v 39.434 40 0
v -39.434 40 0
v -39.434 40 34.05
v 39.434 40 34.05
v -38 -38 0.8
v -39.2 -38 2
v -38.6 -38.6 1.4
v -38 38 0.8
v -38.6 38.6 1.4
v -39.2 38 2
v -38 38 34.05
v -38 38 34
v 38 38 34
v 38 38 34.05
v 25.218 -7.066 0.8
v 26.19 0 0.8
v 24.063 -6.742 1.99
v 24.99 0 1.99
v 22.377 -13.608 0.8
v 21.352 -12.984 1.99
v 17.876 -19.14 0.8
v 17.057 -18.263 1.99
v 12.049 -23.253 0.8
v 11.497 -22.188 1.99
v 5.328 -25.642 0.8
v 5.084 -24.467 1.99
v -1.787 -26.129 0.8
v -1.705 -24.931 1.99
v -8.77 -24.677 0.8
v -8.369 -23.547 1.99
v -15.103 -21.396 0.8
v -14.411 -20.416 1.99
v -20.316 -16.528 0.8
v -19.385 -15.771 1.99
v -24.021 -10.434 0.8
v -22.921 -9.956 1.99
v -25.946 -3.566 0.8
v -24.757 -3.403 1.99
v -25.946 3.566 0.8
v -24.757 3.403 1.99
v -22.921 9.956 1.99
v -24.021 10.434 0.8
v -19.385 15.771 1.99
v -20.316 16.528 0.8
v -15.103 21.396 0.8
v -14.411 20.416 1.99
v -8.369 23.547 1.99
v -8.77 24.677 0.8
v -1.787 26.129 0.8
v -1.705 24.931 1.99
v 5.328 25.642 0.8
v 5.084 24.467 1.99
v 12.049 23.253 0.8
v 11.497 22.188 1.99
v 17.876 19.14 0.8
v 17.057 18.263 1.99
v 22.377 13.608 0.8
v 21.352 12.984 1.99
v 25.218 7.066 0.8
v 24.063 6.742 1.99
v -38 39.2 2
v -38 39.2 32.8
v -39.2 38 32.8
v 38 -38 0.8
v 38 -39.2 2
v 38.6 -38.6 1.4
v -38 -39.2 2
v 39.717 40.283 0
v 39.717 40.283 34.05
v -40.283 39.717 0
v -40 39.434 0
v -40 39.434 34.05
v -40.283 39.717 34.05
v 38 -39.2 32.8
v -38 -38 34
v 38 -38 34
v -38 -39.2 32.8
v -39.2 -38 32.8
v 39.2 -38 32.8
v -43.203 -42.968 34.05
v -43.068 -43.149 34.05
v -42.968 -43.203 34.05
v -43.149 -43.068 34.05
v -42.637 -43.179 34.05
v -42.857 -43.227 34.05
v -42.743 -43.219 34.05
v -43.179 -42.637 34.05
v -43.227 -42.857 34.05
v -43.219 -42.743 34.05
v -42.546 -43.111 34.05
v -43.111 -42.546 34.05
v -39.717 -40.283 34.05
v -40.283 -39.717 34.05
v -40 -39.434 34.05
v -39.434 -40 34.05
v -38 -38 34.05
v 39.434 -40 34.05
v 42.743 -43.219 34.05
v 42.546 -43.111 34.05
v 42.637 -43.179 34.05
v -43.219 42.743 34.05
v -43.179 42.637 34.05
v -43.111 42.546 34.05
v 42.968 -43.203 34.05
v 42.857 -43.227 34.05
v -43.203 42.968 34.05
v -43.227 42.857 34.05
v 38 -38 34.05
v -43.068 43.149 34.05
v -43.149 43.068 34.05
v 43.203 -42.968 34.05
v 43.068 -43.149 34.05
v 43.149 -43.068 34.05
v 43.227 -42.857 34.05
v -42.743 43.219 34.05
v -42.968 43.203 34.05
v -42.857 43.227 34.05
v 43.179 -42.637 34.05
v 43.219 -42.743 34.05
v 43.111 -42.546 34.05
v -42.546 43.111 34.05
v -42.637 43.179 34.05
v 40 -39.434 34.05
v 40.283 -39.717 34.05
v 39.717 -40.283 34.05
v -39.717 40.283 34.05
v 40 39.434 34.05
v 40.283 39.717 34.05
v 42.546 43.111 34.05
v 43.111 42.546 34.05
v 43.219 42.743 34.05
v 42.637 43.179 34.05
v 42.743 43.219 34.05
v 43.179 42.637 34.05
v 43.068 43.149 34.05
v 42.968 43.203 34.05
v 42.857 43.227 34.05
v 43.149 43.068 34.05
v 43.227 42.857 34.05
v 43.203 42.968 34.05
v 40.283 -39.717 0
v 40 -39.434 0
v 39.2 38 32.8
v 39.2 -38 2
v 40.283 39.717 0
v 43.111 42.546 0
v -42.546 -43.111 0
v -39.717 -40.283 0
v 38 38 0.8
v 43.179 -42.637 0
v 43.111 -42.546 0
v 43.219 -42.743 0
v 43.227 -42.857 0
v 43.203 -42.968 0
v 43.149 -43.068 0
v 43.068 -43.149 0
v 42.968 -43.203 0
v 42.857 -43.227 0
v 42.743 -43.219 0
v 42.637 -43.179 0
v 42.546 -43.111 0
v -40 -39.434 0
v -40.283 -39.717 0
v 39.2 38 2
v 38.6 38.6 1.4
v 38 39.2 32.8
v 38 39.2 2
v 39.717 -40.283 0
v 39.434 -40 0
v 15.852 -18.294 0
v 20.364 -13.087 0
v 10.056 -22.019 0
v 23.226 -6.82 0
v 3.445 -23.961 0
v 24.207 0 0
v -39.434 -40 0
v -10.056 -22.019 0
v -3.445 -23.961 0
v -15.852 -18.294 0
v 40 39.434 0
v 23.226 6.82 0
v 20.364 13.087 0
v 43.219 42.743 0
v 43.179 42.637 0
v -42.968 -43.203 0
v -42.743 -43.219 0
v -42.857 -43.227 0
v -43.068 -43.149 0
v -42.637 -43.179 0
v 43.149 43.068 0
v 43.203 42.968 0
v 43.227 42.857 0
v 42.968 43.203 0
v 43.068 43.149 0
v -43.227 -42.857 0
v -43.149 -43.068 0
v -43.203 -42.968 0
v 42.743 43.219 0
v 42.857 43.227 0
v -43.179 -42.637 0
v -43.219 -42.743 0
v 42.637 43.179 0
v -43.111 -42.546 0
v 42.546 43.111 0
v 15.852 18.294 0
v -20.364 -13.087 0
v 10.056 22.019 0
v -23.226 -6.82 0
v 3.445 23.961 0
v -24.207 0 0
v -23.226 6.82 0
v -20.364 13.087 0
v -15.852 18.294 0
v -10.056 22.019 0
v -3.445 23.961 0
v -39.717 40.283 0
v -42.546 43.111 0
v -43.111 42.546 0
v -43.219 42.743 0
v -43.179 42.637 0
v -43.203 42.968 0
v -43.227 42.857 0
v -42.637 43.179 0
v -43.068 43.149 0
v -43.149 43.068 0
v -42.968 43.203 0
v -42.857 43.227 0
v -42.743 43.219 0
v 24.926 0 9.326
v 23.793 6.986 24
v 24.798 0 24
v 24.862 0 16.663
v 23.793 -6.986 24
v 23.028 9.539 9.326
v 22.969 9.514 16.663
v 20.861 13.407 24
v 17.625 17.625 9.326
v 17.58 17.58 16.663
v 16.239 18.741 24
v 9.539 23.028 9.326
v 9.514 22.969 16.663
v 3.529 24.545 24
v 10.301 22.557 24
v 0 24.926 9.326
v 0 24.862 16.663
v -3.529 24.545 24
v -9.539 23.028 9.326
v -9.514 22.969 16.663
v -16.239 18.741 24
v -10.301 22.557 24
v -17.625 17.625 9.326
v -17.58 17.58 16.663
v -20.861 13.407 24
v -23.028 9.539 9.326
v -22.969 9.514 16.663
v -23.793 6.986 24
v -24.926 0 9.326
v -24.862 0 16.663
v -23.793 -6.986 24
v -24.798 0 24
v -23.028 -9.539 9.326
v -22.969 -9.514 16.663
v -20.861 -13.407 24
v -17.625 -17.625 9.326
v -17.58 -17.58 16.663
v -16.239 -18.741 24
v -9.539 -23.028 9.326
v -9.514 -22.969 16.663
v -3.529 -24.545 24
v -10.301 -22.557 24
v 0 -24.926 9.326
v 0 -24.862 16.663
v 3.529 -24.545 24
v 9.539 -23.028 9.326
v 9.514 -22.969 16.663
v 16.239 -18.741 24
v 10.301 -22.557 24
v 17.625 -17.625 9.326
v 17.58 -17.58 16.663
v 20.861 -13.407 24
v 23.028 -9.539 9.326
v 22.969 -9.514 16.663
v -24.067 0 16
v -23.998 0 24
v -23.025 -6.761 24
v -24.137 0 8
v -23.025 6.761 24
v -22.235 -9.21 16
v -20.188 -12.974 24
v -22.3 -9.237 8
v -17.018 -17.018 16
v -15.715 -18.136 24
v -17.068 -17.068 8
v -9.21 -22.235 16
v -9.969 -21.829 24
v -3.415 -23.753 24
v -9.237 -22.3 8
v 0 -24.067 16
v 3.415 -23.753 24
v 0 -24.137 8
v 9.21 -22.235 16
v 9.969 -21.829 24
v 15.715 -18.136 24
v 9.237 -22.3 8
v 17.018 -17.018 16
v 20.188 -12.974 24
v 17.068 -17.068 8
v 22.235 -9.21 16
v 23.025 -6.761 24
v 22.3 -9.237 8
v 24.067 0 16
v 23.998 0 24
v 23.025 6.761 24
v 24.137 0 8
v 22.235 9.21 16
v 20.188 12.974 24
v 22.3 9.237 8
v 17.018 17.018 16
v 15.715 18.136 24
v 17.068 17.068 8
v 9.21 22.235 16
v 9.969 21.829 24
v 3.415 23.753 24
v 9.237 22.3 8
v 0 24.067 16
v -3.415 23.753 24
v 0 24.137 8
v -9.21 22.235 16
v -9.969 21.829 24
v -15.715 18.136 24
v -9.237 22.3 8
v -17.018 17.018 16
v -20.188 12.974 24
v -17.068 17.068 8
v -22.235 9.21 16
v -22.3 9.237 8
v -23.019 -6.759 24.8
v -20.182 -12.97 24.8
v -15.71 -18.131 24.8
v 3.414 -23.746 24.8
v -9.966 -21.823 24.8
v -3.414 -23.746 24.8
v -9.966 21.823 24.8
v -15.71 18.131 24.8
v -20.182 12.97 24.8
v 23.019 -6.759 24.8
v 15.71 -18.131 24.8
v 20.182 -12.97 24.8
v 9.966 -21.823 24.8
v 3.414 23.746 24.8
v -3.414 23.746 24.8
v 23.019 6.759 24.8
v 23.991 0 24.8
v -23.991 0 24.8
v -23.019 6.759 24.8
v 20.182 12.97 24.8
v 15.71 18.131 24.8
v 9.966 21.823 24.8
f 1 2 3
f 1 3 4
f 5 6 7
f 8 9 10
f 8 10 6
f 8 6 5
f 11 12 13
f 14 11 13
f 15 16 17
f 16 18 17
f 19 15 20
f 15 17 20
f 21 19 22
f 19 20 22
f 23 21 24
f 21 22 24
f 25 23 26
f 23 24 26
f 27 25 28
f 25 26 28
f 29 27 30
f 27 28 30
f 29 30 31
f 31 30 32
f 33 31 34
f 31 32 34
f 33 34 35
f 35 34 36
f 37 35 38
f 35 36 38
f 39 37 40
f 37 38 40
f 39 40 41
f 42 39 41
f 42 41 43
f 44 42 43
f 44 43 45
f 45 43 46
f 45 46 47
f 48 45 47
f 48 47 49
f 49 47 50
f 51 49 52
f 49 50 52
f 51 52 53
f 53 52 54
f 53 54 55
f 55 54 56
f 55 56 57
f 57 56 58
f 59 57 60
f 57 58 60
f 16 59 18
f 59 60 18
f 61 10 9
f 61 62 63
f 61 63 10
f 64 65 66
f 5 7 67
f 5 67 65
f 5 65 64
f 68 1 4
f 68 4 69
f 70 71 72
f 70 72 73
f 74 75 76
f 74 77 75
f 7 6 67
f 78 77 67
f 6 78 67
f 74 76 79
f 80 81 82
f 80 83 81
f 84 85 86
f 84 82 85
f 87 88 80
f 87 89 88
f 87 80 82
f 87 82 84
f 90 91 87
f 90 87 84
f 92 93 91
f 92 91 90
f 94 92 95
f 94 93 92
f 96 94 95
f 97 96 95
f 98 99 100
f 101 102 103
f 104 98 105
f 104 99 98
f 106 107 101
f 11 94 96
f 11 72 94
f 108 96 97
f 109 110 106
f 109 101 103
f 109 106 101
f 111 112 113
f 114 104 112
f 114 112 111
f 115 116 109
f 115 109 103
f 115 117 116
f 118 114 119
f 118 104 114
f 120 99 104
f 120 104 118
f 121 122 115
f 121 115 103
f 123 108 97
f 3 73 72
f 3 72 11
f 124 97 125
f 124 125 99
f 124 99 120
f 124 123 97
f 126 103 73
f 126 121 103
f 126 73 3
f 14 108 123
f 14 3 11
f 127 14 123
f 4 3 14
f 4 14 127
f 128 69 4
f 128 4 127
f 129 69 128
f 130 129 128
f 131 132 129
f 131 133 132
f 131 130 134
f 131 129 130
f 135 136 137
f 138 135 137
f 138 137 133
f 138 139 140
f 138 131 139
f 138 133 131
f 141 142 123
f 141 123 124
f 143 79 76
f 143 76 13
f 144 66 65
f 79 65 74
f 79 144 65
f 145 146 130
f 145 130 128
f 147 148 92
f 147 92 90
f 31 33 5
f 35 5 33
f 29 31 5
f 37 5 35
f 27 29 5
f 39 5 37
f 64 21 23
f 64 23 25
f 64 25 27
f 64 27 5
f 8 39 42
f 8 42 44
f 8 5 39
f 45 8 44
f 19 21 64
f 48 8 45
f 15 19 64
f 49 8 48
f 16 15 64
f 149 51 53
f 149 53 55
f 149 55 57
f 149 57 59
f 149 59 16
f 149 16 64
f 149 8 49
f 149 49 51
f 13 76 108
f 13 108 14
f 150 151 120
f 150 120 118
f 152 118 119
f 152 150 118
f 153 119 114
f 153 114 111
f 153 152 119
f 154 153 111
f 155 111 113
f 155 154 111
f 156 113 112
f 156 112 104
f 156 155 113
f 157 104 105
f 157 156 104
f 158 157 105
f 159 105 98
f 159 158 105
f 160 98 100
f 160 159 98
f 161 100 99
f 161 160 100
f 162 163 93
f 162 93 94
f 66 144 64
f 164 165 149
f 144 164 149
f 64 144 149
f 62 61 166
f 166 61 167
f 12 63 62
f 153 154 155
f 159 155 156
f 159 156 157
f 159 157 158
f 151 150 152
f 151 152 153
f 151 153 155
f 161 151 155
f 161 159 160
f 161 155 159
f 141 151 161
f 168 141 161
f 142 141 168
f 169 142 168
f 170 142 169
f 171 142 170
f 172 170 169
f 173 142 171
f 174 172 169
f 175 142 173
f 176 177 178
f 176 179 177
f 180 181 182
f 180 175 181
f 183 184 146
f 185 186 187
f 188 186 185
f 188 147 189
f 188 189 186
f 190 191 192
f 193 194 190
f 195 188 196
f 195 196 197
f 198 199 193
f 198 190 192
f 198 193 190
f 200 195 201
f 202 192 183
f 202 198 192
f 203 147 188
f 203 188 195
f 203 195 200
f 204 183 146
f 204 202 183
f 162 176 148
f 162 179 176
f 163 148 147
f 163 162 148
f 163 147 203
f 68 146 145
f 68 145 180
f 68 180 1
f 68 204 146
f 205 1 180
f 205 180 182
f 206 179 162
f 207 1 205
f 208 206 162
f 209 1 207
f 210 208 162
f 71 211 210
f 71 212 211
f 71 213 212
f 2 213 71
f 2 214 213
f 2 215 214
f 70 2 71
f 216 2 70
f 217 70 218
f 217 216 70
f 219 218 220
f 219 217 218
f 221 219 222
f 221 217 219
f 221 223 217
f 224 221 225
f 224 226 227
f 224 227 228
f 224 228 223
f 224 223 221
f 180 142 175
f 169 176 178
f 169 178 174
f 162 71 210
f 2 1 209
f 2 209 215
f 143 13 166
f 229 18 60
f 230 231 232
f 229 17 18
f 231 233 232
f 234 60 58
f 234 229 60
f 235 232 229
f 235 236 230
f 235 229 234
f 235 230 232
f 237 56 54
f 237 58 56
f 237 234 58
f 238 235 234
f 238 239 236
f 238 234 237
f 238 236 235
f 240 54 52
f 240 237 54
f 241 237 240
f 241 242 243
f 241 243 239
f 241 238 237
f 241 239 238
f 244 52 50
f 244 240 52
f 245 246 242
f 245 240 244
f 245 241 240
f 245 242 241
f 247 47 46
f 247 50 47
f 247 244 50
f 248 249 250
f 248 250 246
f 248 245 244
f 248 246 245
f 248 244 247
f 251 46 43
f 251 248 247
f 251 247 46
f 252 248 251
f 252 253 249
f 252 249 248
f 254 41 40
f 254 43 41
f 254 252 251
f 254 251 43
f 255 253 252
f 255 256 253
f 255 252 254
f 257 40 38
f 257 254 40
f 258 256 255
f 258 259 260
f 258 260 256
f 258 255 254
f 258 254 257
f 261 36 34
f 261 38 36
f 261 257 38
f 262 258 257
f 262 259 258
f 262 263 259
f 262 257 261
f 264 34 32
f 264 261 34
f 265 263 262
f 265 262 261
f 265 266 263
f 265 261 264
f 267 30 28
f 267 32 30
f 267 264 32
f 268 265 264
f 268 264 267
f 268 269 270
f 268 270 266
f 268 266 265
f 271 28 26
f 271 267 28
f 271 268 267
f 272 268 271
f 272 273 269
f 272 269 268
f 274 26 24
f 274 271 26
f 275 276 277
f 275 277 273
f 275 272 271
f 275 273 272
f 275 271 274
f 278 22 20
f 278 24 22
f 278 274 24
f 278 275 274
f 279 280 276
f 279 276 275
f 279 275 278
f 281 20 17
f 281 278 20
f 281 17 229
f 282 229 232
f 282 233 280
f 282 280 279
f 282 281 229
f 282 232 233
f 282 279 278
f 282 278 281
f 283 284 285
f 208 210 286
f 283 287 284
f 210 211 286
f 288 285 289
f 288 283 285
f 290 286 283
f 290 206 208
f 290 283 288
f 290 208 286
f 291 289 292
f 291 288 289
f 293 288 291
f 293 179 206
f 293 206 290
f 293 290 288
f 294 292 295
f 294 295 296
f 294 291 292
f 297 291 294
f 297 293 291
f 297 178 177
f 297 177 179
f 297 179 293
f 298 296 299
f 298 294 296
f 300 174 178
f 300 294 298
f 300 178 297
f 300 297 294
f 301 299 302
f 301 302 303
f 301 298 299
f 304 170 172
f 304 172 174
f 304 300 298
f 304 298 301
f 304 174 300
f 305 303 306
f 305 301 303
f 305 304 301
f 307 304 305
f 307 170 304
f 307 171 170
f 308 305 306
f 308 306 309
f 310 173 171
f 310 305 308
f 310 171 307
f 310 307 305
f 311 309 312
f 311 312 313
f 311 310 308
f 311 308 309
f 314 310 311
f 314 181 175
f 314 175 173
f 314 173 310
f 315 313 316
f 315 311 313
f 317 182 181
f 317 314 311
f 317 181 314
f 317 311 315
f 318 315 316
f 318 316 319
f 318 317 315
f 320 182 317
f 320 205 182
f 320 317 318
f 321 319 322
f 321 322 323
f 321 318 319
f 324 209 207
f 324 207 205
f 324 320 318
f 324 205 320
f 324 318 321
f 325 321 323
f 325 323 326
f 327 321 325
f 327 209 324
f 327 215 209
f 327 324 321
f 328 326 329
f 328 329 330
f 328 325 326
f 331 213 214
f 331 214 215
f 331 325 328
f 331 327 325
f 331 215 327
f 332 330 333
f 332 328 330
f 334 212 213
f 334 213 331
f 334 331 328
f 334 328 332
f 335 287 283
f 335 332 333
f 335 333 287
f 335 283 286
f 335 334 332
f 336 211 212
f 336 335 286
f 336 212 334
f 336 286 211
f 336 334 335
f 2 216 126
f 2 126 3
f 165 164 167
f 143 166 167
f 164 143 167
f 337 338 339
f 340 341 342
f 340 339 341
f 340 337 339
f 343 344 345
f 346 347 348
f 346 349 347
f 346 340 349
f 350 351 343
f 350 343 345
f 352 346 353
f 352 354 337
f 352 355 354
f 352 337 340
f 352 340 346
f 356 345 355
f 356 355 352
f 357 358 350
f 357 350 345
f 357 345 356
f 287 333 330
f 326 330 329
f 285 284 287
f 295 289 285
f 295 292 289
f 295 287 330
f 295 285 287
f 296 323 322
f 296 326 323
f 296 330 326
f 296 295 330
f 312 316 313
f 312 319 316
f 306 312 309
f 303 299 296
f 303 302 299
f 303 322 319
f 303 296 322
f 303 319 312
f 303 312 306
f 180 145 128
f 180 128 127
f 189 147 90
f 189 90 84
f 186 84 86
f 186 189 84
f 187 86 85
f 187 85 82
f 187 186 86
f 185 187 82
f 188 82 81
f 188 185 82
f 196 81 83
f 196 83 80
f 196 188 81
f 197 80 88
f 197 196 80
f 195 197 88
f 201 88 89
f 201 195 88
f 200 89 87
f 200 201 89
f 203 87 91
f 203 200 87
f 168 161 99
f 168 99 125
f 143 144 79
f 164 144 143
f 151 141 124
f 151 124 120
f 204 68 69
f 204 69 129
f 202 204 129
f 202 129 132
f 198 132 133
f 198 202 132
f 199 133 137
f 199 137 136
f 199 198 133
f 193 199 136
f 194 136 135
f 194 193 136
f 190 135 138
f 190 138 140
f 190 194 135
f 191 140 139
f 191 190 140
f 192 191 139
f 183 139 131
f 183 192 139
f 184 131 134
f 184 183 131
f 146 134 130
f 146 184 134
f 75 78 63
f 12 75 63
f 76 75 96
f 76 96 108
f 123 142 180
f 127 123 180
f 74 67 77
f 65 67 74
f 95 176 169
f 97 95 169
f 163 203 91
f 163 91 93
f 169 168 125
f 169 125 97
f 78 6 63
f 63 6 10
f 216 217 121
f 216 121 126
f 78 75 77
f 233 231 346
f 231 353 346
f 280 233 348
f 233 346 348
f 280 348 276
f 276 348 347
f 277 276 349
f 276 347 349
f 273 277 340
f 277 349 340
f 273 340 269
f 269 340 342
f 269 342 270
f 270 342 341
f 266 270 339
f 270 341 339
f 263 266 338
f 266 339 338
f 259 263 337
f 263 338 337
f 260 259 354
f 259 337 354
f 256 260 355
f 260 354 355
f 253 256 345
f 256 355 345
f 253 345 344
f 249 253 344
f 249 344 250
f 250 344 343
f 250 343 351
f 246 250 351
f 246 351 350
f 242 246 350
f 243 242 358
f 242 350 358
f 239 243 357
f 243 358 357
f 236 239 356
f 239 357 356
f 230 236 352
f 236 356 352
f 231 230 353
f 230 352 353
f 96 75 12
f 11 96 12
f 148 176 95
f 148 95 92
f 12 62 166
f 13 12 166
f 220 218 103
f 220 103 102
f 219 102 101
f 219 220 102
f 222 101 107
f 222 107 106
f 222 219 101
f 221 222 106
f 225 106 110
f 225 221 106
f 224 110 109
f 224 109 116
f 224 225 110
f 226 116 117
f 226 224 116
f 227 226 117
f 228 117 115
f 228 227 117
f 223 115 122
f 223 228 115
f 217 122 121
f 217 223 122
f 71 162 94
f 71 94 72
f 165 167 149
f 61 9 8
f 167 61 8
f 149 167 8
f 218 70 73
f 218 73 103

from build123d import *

# Parameters (mm, degrees)
F0_W             = 80
F0_H             = 80
F1_DEPTH         = 34
F2_T             = -0.8
F3_R             = 25
F4_DEPTH         = 24
F4_TAPER         = 0.5
F5_T1_DEPTH      = 78.4
F5_T3_DEPTH      = 78.4
F6_W             = 80
F6_H             = 80
F6_W_2           = 76
F6_H_2           = 76
F7_DEPTH         = 0.05
F8_SIZE          = 1.19999
F11_DEPTH        = 34.05
F11_COPIES_COUNT = 4


# Not quite as in the source:
# - a fillet or chamfer that OpenCascade refuses, or shapes differently, is made with other operations: its cross-section is extruded or revolved along the edge and cut away or added
# - a fillet or chamfer is up to 0.001 mm smaller than in the source, because OpenCascade refuses the exact size
# - a pattern or mirror of a feature is missing from the dataset's text; its kind, count and spacing are read off the source's solid


with BuildPart() as f1:
    # F0 (on Top) → F1 (new body)
    with BuildSketch(Plane.XY):
        Rectangle(F0_W, F0_H)
    extrude(amount=F1_DEPTH)

    # F2
    f2_openings = [f1.faces().sort_by_distance(p)[0] for p in [
        (0, 0, 34),
    ]]
    offset(amount=F2_T, openings=f2_openings)

    # F3 (on face) → F4 (join)
    with BuildSketch(Plane.XY.offset(0.8)):
        Circle(F3_R)
    extrude(amount=F4_DEPTH, taper=F4_TAPER)

    # F5: chamfer of 1.2 on 5 edges, made by hand

    # F5_s2 → F5_t1 (join)
    with BuildSketch(Plane.XZ.offset(-39.2)):
        Polygon((-39.2, 2), (-38, 0.8), (-39.2, 0.8), align=None)
        Polygon((39.2, 2), (38, 0.8), (39.2, 0.8), align=None)
    extrude(amount=F5_T1_DEPTH)

    # F5_s4 → F5_t3 (join)
    with BuildSketch(Plane.YZ.offset(-39.2)):
        Polygon((-39.2, 2), (-38, 0.8), (-39.2, 0.8), align=None)
        Polygon((39.2, 2), (38, 0.8), (39.2, 0.8), align=None)
    extrude(amount=F5_T3_DEPTH)

    # F5_s5 → F5_t6 (revolve)
    with BuildSketch(Plane.XZ):
        Polygon((26.1895734527, 0.8), (24.989619145, 1.9895281574), (25, 0.8), align=None)
    revolve(axis=Axis((0, 0, 0.8), (0, 0, -1)))

    # F6 (on face) → F7 (join)
    with BuildSketch(Plane.XY.offset(34)):
        Rectangle(F6_W, F6_H)
        Rectangle(F6_W_2, F6_H_2, mode=Mode.SUBTRACT)
    extrude(amount=F7_DEPTH)

    # F8 (size 1.2 in the source; OpenCascade refuses exactly that, so slightly less here)
    f8_edges = [f1.edges().sort_by_distance(p)[0] for p in [
        (0, -39.2, 34),
        (-39.2, 0, 34),
        (-39.2, -39.2, 18),
        (-39.2, 39.2, 18),
        (0, 39.2, 34),
        (39.2, 0, 34),
        (39.2, 39.2, 18),
        (39.2, -39.2, 18),
    ]]
    chamfer(f8_edges, length=F8_SIZE)

    # F9: chamfer of 0.8 on 1 edges, made by hand

    # F9_s1 → F9_t2 (revolve, cut)
    with BuildSketch(Plane.XZ):
        Polygon((24.7975364014, 24.0000304615), (23.990555173, 24.8), (24.790555173, 24.8), align=None)
    revolve(axis=Axis((0, 0, 24.8), (0, 0, -1)), mode=Mode.SUBTRACT)

    # F10 (on face) → F11 (join, through all)
    with BuildSketch(Plane(origin=(0, 0, 0), x_dir=(1, 0, 0), z_dir=(0, 0, -1))):
        with BuildLine():
            Line((-39.1612012219, 39.7268866468), (-39.7171572875, 40.2828427125))
            ThreePointArc((-39.7171572875, 40.2828427125), (-39.7171572875, 39.7171572875), (-40.2828427125, 39.7171572875))
            Line((-40.2828427125, 39.7171572875), (-39.7268866468, 39.1612012219))
            Line((-39.7268866468, 39.1612012219), (-39.1612012219, 39.7268866468))
        make_face()
        with BuildLine():
            ThreePointArc((-40.2828427125, 39.7171572875), (-39.7171572875, 39.7171572875), (-39.7171572875, 40.2828427125))
            Line((-39.7171572875, 40.2828427125), (-42.5455844123, 43.1112698372))
            ThreePointArc((-42.5455844123, 43.1112698372), (-43.1112698372, 43.1112698372), (-43.1112698372, 42.5455844123))
            Line((-43.1112698372, 42.5455844123), (-40.2828427125, 39.7171572875))
        make_face()
    f11 = extrude(amount=-F11_DEPTH)

    # F11_copies: F11 ×4 about axis
    f11_copies_axis = Axis((0, 0, 0), (0, 0, 1))
    for i in range(1, F11_COPIES_COUNT):
        add(f11.rotate(f11_copies_axis, i * 360 / F11_COPIES_COUNT))

    # F12 (on Front) → F13 (revolve, cut)
    with BuildSketch(Plane.XZ):
        Polygon((-23.9975059387, 24.0000304615), (-24.2264749318, -2.2372173829), (0, -2.2372173829), (0, 24.0000304615), align=None)
    revolve(axis=Axis((0, 0, 10.8814065393), (0, 0, 1)), mode=Mode.SUBTRACT)


solid = f1.part
